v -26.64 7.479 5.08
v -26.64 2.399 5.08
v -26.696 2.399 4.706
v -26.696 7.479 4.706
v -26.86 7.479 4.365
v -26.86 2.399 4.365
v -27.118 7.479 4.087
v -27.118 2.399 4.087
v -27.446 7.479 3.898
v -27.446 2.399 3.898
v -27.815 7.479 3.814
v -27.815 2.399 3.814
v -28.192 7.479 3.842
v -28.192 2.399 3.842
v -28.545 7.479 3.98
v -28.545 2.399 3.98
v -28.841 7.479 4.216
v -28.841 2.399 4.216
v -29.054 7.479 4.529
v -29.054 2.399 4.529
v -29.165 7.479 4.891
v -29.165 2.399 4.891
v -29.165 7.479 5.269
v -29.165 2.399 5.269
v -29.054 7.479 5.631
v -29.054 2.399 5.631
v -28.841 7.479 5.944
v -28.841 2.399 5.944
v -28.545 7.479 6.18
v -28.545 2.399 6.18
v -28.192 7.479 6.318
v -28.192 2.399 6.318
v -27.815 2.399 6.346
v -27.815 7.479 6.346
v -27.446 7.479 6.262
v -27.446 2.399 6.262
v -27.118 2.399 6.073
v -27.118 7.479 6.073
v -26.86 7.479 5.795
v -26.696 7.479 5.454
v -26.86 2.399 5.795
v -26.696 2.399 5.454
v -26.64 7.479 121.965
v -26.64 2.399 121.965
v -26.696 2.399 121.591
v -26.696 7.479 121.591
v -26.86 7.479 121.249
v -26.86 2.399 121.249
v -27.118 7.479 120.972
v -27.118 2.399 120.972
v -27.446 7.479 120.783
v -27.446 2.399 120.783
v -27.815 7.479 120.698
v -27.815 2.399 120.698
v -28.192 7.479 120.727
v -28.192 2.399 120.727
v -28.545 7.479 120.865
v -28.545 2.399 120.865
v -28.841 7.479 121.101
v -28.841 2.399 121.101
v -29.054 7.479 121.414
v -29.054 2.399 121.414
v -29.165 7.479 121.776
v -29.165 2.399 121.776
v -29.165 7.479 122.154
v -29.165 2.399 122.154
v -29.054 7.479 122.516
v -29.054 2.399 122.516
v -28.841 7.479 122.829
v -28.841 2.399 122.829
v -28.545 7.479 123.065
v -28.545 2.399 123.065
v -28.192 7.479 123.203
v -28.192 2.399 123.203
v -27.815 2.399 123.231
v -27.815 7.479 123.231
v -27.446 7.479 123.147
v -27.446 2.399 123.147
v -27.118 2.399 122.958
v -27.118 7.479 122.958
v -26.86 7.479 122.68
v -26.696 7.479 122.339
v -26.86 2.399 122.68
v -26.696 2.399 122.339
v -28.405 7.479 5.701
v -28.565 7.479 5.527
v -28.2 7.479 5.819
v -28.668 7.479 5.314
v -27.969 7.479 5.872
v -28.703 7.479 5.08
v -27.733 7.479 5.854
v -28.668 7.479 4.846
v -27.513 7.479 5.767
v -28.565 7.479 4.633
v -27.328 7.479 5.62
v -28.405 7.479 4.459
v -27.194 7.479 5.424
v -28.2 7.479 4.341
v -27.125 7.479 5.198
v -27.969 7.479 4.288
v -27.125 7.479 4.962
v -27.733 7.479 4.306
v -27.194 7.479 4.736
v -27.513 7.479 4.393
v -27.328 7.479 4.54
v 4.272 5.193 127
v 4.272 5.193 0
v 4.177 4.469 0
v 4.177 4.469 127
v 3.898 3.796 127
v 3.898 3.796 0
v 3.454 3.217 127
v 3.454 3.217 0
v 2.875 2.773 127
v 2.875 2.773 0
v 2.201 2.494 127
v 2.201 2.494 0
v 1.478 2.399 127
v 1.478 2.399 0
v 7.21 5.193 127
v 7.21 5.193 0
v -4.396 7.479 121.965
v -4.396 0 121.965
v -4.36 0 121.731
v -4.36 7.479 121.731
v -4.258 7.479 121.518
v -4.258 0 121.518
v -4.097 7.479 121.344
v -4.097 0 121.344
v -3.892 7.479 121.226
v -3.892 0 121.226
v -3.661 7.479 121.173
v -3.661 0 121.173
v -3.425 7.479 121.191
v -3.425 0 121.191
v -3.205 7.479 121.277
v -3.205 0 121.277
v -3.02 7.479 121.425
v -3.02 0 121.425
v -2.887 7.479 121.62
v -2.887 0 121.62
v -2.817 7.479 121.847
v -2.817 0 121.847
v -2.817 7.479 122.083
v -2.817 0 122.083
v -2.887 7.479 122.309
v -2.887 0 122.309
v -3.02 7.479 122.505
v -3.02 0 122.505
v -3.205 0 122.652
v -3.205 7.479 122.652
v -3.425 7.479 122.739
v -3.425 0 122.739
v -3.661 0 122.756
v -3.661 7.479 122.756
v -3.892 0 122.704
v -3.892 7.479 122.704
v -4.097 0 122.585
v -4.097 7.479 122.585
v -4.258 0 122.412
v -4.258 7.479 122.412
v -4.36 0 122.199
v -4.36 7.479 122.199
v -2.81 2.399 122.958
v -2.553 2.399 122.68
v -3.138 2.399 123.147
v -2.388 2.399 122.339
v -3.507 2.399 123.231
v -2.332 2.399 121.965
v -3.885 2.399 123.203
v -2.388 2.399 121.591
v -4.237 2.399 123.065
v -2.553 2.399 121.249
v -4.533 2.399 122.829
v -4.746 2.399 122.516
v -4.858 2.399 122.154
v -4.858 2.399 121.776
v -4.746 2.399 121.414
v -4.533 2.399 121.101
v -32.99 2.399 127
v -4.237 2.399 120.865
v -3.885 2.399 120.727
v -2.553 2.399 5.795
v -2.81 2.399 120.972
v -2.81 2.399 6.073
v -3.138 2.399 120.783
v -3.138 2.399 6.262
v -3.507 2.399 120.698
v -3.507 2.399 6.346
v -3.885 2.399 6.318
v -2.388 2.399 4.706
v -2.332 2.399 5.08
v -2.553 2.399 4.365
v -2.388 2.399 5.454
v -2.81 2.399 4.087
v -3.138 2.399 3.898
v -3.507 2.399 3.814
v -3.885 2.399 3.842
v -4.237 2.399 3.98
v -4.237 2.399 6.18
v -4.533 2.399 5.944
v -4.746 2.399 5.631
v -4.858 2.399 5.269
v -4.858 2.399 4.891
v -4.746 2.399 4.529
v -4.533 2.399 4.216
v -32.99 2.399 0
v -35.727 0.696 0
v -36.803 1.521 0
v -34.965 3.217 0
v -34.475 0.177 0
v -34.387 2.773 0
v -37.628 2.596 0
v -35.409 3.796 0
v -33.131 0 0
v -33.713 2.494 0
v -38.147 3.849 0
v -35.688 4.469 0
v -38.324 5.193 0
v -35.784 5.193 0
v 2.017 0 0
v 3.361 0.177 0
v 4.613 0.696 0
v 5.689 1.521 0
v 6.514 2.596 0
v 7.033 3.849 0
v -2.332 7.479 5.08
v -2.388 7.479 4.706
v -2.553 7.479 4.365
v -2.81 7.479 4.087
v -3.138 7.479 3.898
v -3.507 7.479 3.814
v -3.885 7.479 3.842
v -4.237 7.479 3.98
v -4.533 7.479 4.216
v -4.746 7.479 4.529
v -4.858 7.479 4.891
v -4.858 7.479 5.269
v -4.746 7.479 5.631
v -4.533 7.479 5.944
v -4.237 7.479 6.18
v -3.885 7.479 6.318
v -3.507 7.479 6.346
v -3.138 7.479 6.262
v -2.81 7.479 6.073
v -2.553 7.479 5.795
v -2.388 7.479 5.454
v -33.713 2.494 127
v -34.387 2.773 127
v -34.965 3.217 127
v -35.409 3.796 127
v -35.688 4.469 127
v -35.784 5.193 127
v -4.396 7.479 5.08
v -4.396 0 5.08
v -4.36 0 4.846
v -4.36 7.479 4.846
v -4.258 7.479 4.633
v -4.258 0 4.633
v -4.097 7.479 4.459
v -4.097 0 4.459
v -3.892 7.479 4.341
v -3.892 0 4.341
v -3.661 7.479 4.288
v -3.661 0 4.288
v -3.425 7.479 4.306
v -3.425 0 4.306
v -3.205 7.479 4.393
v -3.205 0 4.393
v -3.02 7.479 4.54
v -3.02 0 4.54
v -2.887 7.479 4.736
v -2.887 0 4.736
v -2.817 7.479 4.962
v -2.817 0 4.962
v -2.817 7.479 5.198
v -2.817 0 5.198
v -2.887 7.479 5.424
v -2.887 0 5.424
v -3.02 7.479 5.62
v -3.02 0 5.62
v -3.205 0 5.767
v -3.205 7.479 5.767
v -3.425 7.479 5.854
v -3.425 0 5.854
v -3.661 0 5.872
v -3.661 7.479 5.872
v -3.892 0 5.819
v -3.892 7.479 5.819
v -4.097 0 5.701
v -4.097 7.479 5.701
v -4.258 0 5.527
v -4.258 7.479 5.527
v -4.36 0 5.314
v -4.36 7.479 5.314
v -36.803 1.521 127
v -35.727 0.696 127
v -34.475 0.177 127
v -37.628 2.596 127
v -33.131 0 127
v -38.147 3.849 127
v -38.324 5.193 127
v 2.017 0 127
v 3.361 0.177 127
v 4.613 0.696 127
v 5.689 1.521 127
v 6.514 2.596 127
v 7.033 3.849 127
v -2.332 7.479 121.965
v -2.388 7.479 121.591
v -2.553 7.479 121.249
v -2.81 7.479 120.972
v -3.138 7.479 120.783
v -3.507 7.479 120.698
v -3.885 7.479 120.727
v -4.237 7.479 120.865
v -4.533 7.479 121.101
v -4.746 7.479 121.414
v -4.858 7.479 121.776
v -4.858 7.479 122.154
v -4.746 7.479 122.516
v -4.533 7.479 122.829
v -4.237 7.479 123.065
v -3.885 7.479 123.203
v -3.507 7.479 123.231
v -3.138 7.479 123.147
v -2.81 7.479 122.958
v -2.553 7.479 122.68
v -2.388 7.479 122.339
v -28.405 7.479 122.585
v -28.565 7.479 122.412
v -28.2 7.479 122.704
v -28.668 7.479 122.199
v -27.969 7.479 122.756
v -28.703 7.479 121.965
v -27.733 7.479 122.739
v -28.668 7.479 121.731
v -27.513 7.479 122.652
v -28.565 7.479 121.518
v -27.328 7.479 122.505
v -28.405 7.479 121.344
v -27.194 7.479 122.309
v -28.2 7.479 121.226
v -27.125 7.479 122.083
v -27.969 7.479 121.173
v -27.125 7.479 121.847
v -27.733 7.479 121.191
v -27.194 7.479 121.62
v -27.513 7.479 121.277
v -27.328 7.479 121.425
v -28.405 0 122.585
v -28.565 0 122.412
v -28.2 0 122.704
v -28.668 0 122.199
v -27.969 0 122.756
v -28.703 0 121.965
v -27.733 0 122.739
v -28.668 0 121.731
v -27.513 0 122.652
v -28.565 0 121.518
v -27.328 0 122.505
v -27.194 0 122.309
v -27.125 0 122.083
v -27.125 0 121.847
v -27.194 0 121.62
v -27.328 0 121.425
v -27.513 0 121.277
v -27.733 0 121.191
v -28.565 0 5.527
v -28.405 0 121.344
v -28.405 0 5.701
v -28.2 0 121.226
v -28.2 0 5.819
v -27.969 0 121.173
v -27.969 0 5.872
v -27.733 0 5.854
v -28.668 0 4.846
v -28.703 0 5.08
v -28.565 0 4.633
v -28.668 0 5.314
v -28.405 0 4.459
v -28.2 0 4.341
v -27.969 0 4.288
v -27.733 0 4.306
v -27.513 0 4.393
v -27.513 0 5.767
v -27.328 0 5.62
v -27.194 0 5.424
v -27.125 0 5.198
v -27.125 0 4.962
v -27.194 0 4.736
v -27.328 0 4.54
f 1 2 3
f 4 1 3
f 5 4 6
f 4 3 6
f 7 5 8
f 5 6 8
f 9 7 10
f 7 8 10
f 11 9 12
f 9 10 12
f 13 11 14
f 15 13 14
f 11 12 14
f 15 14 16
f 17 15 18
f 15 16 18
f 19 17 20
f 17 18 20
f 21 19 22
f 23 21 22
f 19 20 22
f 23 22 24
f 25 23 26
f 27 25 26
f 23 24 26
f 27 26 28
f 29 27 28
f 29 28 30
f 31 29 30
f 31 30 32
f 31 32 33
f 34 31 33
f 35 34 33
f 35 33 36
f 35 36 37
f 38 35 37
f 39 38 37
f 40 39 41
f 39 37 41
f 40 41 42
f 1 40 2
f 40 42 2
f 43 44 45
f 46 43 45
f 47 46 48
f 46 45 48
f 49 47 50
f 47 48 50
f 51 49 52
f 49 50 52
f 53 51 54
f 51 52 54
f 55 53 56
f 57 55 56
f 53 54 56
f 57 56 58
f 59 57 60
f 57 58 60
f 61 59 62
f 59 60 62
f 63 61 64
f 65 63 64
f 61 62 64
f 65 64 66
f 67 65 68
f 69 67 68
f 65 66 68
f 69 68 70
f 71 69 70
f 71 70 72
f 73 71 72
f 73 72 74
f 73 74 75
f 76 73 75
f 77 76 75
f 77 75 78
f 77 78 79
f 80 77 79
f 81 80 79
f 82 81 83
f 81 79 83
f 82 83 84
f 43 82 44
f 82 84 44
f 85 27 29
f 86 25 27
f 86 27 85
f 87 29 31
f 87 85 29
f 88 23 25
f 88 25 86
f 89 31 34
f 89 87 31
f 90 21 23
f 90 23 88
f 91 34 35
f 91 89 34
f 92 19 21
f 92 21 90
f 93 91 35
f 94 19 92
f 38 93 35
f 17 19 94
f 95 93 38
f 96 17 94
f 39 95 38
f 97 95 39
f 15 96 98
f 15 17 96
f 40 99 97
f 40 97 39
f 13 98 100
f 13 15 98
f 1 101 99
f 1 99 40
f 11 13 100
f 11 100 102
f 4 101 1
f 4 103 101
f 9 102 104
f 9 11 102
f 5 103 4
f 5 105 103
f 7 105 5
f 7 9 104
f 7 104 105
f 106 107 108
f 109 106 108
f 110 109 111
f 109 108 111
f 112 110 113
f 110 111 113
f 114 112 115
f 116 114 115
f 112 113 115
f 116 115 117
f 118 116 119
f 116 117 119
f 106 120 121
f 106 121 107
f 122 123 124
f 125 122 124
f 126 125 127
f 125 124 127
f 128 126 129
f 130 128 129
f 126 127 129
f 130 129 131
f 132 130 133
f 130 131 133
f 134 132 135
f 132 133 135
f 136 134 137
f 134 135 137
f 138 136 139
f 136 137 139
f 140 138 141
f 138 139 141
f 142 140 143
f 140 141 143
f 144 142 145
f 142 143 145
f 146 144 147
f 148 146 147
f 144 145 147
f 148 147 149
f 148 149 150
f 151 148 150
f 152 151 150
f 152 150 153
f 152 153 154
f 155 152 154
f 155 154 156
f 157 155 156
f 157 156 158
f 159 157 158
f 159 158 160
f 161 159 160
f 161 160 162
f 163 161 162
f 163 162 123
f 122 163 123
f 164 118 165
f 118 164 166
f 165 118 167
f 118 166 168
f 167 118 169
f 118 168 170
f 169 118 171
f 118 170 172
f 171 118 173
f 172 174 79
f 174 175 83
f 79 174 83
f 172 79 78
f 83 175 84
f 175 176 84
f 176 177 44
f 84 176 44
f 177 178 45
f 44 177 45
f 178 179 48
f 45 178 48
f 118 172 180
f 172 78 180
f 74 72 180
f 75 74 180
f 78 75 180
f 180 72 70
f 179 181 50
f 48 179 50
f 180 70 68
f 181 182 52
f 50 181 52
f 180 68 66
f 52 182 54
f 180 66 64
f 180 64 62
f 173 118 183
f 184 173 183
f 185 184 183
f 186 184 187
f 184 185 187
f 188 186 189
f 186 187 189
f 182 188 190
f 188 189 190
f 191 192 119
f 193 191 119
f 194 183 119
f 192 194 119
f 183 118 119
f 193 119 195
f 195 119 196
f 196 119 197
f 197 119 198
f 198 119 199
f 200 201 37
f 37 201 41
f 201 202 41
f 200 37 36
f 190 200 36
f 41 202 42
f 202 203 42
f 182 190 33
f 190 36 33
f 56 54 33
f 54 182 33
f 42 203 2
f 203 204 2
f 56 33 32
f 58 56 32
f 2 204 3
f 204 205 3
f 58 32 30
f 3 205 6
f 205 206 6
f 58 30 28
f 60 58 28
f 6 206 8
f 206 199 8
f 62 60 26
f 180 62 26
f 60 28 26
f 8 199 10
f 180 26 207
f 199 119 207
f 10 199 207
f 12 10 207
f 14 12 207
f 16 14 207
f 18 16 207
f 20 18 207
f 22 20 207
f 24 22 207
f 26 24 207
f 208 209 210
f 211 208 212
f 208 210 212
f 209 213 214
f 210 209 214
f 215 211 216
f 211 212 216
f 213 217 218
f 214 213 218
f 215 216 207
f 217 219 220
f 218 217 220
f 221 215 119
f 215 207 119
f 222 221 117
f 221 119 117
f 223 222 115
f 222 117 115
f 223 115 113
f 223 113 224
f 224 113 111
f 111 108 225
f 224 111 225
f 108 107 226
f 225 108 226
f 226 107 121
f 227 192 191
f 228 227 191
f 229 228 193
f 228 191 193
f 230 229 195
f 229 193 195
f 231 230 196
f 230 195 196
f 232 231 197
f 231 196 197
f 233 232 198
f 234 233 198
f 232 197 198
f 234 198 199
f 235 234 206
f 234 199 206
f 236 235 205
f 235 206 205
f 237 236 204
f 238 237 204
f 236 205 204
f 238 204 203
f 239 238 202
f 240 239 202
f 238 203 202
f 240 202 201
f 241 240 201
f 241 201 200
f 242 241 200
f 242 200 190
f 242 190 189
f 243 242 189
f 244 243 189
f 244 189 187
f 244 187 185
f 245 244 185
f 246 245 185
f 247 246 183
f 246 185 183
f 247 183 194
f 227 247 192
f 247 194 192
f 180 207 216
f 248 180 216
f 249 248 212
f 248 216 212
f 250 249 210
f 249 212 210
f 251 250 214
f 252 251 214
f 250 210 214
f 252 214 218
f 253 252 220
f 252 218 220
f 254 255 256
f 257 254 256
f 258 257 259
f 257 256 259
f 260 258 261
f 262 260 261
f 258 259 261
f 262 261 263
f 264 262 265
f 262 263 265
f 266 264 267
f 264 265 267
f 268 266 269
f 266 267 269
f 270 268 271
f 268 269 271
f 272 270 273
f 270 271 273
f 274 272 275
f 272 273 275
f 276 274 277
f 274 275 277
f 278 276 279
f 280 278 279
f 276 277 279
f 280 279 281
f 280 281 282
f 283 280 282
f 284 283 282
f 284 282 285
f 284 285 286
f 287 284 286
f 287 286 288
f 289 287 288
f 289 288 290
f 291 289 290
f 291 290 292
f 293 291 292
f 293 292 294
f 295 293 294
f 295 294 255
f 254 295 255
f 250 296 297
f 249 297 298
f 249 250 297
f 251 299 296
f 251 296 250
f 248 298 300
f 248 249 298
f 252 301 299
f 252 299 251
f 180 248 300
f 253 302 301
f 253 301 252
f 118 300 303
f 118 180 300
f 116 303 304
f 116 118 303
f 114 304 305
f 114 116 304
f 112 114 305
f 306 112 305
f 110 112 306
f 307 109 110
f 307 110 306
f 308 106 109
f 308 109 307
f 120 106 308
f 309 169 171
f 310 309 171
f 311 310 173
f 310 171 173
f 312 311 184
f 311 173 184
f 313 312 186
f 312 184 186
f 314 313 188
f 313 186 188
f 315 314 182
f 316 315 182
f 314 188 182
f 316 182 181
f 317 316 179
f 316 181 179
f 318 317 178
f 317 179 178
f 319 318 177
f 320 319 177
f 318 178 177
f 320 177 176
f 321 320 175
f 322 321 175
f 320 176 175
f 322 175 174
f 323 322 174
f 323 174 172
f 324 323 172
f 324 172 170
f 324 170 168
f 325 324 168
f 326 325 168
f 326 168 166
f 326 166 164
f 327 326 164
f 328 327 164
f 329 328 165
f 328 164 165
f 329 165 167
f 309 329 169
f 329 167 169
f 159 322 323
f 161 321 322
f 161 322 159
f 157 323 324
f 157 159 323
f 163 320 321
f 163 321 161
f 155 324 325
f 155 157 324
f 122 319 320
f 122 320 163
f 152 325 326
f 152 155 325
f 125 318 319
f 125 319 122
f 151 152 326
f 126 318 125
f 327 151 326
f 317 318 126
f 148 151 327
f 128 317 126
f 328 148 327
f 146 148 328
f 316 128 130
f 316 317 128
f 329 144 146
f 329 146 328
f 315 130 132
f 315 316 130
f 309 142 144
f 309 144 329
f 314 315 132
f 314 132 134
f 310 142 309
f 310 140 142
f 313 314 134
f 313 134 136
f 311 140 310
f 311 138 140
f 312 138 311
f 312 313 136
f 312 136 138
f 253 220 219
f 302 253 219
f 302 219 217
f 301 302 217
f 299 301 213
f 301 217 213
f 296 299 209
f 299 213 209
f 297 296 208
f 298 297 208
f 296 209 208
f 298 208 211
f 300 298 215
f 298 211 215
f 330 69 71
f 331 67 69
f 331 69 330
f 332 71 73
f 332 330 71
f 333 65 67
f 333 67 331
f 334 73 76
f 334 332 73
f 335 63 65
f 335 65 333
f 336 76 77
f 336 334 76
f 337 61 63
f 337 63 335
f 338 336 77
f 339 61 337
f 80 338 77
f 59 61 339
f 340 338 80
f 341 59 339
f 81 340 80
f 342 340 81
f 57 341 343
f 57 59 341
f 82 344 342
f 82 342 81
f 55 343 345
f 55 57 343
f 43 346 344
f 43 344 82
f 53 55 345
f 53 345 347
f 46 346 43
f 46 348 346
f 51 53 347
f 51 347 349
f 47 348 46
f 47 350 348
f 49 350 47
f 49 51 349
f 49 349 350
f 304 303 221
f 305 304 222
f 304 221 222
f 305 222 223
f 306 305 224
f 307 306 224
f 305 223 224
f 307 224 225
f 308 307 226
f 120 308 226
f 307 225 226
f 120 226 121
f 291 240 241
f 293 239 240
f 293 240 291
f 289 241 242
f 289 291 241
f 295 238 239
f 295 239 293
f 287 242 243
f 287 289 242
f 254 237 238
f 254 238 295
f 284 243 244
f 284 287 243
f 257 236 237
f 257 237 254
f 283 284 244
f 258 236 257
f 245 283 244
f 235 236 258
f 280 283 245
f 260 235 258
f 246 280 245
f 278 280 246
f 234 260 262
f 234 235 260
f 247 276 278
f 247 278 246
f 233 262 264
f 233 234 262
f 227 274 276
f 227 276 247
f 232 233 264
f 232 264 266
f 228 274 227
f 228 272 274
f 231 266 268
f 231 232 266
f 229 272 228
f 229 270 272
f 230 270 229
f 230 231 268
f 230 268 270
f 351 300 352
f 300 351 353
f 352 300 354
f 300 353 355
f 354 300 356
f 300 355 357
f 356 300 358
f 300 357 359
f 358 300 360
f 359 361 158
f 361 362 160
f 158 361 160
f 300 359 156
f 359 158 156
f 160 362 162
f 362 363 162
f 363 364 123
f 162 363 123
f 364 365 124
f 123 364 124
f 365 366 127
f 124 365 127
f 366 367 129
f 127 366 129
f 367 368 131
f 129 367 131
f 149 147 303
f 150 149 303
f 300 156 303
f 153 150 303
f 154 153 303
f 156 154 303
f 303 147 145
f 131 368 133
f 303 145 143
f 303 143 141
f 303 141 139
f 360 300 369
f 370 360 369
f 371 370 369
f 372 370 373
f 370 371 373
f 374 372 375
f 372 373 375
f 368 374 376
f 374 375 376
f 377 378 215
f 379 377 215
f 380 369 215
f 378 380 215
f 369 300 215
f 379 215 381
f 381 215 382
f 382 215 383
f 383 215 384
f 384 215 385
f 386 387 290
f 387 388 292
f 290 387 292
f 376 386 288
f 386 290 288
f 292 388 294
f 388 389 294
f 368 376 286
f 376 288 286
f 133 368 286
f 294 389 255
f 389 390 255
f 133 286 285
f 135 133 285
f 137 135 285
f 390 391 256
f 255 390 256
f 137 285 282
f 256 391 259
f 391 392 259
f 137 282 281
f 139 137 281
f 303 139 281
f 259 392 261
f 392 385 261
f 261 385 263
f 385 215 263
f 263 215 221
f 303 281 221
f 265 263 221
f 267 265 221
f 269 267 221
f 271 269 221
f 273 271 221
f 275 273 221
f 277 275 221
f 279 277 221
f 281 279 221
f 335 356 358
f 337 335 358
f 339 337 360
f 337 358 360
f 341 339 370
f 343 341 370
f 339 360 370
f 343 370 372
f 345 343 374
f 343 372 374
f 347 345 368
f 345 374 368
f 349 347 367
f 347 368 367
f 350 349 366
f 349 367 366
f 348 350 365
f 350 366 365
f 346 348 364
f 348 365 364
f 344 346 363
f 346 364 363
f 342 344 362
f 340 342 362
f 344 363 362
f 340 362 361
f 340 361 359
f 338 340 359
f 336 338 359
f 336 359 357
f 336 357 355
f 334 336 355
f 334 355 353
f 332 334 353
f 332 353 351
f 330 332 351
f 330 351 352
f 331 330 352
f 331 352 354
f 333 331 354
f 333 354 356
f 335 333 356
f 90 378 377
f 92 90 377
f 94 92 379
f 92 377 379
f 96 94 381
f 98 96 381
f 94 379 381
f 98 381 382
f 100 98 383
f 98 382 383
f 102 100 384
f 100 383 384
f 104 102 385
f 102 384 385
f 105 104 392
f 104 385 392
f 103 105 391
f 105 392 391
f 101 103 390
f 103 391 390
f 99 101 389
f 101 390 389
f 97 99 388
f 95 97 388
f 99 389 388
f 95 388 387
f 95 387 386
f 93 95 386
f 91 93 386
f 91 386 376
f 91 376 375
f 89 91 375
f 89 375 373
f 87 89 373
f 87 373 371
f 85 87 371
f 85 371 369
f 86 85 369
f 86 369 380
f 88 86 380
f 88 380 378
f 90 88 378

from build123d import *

# Parameters (mm, degrees)
BOSS_EXTRUDE1_DEPTH                = 127
SKETCH4_R                          = 1.27
BOSS_EXTRUDE2_DEPTH                = 5.08
F_1_16_0_0625_DIAMETER_HOLE1_D     = 1.5875
F_1_16_0_0625_DIAMETER_HOLE1_DEPTH = 7.478589674


with BuildPart() as part:
    # Sketch1 → Boss-Extrude1 (new body)
    with BuildSketch(Plane.XY):
        with BuildLine():
            Line((-33.131044693, 0), (2.017058644, 0))
            ThreePointArc((2.017058644, 0), (5.688774014, 1.520874304), (7.209648317, 5.192589674))
            Line((7.209648317, 5.192589674), (4.272091587, 5.192589674))
            ThreePointArc((4.272091587, 5.192589674), (3.453747934, 3.216933327), (1.478091587, 2.398589674))
            Line((1.478091587, 2.398589674), (-32.989634367, 2.398589674))
            ThreePointArc((-32.989634367, 2.398589674), (-34.965290713, 3.216933327), (-35.783634367, 5.192589674))
            Line((-35.783634367, 5.192589674), (-38.323634367, 5.192589674))
            ThreePointArc((-38.323634367, 5.192589674), (-36.802760063, 1.520874304), (-33.131044693, 0))
        make_face()
    extrude(amount=BOSS_EXTRUDE1_DEPTH)

    # Sketch4 → Boss-Extrude2 (add)
    with BuildSketch(Plane(origin=(0, 2.398589674, 0), x_dir=(1, 0, 0), z_dir=(0, 1, 0))):
        with Locations((-27.909634367, -5.08)):
            Circle(SKETCH4_R)
        with Locations((-3.601908413, -5.08)):
            Circle(SKETCH4_R)
        with Locations((-27.909634367, -121.964874012)):
            Circle(SKETCH4_R)
        with Locations((-3.601908413, -121.964874012)):
            Circle(SKETCH4_R)
    extrude(amount=BOSS_EXTRUDE2_DEPTH)

    # 1/16 (0.0625) Diameter Hole1
    with Locations(Plane(origin=(0, 7.478589674, 0), x_dir=(1, 0, 0), z_dir=(0, 1, 0))):
        with Locations((-27.909634367, -5.08), (-3.601908413, -5.08), (-27.909634367, -121.964874012), (-3.601908413, -121.964874012)):
            Hole(F_1_16_0_0625_DIAMETER_HOLE1_D / 2, depth=F_1_16_0_0625_DIAMETER_HOLE1_DEPTH)


solid = part.part
